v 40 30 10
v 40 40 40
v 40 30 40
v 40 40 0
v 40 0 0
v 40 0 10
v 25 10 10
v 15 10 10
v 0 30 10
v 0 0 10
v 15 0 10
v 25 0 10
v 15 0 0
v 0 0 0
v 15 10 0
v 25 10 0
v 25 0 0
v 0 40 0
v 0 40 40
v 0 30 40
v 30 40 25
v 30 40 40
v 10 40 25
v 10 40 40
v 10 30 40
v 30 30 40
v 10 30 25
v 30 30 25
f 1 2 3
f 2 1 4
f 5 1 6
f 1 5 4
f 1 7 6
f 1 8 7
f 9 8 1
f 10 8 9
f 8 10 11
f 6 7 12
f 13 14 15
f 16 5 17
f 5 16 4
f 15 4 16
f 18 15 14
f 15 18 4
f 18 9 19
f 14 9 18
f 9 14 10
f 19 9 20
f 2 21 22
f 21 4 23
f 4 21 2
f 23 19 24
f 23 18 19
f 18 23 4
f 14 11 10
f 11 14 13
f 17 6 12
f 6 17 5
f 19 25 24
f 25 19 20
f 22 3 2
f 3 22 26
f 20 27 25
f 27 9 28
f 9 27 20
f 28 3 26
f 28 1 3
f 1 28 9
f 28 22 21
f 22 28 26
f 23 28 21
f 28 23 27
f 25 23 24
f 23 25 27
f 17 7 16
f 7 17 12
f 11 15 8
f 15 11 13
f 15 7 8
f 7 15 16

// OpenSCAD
difference(){
// ele
  union(){
// base
    cube([40, 40, 10], center=false);
// pared
    translate([0, 30, 0]){
      cube([40, 10, 40], center=false);
    }
  }
// huecos
  union(){
// hueco pared
    translate([10, 30, 25]){
      cube([20, 30, 30], center=false);
    }
// hueco base
    translate([15, 0, 0]){
      cube([10, 10, 10], center=false);
    }
  }
}
